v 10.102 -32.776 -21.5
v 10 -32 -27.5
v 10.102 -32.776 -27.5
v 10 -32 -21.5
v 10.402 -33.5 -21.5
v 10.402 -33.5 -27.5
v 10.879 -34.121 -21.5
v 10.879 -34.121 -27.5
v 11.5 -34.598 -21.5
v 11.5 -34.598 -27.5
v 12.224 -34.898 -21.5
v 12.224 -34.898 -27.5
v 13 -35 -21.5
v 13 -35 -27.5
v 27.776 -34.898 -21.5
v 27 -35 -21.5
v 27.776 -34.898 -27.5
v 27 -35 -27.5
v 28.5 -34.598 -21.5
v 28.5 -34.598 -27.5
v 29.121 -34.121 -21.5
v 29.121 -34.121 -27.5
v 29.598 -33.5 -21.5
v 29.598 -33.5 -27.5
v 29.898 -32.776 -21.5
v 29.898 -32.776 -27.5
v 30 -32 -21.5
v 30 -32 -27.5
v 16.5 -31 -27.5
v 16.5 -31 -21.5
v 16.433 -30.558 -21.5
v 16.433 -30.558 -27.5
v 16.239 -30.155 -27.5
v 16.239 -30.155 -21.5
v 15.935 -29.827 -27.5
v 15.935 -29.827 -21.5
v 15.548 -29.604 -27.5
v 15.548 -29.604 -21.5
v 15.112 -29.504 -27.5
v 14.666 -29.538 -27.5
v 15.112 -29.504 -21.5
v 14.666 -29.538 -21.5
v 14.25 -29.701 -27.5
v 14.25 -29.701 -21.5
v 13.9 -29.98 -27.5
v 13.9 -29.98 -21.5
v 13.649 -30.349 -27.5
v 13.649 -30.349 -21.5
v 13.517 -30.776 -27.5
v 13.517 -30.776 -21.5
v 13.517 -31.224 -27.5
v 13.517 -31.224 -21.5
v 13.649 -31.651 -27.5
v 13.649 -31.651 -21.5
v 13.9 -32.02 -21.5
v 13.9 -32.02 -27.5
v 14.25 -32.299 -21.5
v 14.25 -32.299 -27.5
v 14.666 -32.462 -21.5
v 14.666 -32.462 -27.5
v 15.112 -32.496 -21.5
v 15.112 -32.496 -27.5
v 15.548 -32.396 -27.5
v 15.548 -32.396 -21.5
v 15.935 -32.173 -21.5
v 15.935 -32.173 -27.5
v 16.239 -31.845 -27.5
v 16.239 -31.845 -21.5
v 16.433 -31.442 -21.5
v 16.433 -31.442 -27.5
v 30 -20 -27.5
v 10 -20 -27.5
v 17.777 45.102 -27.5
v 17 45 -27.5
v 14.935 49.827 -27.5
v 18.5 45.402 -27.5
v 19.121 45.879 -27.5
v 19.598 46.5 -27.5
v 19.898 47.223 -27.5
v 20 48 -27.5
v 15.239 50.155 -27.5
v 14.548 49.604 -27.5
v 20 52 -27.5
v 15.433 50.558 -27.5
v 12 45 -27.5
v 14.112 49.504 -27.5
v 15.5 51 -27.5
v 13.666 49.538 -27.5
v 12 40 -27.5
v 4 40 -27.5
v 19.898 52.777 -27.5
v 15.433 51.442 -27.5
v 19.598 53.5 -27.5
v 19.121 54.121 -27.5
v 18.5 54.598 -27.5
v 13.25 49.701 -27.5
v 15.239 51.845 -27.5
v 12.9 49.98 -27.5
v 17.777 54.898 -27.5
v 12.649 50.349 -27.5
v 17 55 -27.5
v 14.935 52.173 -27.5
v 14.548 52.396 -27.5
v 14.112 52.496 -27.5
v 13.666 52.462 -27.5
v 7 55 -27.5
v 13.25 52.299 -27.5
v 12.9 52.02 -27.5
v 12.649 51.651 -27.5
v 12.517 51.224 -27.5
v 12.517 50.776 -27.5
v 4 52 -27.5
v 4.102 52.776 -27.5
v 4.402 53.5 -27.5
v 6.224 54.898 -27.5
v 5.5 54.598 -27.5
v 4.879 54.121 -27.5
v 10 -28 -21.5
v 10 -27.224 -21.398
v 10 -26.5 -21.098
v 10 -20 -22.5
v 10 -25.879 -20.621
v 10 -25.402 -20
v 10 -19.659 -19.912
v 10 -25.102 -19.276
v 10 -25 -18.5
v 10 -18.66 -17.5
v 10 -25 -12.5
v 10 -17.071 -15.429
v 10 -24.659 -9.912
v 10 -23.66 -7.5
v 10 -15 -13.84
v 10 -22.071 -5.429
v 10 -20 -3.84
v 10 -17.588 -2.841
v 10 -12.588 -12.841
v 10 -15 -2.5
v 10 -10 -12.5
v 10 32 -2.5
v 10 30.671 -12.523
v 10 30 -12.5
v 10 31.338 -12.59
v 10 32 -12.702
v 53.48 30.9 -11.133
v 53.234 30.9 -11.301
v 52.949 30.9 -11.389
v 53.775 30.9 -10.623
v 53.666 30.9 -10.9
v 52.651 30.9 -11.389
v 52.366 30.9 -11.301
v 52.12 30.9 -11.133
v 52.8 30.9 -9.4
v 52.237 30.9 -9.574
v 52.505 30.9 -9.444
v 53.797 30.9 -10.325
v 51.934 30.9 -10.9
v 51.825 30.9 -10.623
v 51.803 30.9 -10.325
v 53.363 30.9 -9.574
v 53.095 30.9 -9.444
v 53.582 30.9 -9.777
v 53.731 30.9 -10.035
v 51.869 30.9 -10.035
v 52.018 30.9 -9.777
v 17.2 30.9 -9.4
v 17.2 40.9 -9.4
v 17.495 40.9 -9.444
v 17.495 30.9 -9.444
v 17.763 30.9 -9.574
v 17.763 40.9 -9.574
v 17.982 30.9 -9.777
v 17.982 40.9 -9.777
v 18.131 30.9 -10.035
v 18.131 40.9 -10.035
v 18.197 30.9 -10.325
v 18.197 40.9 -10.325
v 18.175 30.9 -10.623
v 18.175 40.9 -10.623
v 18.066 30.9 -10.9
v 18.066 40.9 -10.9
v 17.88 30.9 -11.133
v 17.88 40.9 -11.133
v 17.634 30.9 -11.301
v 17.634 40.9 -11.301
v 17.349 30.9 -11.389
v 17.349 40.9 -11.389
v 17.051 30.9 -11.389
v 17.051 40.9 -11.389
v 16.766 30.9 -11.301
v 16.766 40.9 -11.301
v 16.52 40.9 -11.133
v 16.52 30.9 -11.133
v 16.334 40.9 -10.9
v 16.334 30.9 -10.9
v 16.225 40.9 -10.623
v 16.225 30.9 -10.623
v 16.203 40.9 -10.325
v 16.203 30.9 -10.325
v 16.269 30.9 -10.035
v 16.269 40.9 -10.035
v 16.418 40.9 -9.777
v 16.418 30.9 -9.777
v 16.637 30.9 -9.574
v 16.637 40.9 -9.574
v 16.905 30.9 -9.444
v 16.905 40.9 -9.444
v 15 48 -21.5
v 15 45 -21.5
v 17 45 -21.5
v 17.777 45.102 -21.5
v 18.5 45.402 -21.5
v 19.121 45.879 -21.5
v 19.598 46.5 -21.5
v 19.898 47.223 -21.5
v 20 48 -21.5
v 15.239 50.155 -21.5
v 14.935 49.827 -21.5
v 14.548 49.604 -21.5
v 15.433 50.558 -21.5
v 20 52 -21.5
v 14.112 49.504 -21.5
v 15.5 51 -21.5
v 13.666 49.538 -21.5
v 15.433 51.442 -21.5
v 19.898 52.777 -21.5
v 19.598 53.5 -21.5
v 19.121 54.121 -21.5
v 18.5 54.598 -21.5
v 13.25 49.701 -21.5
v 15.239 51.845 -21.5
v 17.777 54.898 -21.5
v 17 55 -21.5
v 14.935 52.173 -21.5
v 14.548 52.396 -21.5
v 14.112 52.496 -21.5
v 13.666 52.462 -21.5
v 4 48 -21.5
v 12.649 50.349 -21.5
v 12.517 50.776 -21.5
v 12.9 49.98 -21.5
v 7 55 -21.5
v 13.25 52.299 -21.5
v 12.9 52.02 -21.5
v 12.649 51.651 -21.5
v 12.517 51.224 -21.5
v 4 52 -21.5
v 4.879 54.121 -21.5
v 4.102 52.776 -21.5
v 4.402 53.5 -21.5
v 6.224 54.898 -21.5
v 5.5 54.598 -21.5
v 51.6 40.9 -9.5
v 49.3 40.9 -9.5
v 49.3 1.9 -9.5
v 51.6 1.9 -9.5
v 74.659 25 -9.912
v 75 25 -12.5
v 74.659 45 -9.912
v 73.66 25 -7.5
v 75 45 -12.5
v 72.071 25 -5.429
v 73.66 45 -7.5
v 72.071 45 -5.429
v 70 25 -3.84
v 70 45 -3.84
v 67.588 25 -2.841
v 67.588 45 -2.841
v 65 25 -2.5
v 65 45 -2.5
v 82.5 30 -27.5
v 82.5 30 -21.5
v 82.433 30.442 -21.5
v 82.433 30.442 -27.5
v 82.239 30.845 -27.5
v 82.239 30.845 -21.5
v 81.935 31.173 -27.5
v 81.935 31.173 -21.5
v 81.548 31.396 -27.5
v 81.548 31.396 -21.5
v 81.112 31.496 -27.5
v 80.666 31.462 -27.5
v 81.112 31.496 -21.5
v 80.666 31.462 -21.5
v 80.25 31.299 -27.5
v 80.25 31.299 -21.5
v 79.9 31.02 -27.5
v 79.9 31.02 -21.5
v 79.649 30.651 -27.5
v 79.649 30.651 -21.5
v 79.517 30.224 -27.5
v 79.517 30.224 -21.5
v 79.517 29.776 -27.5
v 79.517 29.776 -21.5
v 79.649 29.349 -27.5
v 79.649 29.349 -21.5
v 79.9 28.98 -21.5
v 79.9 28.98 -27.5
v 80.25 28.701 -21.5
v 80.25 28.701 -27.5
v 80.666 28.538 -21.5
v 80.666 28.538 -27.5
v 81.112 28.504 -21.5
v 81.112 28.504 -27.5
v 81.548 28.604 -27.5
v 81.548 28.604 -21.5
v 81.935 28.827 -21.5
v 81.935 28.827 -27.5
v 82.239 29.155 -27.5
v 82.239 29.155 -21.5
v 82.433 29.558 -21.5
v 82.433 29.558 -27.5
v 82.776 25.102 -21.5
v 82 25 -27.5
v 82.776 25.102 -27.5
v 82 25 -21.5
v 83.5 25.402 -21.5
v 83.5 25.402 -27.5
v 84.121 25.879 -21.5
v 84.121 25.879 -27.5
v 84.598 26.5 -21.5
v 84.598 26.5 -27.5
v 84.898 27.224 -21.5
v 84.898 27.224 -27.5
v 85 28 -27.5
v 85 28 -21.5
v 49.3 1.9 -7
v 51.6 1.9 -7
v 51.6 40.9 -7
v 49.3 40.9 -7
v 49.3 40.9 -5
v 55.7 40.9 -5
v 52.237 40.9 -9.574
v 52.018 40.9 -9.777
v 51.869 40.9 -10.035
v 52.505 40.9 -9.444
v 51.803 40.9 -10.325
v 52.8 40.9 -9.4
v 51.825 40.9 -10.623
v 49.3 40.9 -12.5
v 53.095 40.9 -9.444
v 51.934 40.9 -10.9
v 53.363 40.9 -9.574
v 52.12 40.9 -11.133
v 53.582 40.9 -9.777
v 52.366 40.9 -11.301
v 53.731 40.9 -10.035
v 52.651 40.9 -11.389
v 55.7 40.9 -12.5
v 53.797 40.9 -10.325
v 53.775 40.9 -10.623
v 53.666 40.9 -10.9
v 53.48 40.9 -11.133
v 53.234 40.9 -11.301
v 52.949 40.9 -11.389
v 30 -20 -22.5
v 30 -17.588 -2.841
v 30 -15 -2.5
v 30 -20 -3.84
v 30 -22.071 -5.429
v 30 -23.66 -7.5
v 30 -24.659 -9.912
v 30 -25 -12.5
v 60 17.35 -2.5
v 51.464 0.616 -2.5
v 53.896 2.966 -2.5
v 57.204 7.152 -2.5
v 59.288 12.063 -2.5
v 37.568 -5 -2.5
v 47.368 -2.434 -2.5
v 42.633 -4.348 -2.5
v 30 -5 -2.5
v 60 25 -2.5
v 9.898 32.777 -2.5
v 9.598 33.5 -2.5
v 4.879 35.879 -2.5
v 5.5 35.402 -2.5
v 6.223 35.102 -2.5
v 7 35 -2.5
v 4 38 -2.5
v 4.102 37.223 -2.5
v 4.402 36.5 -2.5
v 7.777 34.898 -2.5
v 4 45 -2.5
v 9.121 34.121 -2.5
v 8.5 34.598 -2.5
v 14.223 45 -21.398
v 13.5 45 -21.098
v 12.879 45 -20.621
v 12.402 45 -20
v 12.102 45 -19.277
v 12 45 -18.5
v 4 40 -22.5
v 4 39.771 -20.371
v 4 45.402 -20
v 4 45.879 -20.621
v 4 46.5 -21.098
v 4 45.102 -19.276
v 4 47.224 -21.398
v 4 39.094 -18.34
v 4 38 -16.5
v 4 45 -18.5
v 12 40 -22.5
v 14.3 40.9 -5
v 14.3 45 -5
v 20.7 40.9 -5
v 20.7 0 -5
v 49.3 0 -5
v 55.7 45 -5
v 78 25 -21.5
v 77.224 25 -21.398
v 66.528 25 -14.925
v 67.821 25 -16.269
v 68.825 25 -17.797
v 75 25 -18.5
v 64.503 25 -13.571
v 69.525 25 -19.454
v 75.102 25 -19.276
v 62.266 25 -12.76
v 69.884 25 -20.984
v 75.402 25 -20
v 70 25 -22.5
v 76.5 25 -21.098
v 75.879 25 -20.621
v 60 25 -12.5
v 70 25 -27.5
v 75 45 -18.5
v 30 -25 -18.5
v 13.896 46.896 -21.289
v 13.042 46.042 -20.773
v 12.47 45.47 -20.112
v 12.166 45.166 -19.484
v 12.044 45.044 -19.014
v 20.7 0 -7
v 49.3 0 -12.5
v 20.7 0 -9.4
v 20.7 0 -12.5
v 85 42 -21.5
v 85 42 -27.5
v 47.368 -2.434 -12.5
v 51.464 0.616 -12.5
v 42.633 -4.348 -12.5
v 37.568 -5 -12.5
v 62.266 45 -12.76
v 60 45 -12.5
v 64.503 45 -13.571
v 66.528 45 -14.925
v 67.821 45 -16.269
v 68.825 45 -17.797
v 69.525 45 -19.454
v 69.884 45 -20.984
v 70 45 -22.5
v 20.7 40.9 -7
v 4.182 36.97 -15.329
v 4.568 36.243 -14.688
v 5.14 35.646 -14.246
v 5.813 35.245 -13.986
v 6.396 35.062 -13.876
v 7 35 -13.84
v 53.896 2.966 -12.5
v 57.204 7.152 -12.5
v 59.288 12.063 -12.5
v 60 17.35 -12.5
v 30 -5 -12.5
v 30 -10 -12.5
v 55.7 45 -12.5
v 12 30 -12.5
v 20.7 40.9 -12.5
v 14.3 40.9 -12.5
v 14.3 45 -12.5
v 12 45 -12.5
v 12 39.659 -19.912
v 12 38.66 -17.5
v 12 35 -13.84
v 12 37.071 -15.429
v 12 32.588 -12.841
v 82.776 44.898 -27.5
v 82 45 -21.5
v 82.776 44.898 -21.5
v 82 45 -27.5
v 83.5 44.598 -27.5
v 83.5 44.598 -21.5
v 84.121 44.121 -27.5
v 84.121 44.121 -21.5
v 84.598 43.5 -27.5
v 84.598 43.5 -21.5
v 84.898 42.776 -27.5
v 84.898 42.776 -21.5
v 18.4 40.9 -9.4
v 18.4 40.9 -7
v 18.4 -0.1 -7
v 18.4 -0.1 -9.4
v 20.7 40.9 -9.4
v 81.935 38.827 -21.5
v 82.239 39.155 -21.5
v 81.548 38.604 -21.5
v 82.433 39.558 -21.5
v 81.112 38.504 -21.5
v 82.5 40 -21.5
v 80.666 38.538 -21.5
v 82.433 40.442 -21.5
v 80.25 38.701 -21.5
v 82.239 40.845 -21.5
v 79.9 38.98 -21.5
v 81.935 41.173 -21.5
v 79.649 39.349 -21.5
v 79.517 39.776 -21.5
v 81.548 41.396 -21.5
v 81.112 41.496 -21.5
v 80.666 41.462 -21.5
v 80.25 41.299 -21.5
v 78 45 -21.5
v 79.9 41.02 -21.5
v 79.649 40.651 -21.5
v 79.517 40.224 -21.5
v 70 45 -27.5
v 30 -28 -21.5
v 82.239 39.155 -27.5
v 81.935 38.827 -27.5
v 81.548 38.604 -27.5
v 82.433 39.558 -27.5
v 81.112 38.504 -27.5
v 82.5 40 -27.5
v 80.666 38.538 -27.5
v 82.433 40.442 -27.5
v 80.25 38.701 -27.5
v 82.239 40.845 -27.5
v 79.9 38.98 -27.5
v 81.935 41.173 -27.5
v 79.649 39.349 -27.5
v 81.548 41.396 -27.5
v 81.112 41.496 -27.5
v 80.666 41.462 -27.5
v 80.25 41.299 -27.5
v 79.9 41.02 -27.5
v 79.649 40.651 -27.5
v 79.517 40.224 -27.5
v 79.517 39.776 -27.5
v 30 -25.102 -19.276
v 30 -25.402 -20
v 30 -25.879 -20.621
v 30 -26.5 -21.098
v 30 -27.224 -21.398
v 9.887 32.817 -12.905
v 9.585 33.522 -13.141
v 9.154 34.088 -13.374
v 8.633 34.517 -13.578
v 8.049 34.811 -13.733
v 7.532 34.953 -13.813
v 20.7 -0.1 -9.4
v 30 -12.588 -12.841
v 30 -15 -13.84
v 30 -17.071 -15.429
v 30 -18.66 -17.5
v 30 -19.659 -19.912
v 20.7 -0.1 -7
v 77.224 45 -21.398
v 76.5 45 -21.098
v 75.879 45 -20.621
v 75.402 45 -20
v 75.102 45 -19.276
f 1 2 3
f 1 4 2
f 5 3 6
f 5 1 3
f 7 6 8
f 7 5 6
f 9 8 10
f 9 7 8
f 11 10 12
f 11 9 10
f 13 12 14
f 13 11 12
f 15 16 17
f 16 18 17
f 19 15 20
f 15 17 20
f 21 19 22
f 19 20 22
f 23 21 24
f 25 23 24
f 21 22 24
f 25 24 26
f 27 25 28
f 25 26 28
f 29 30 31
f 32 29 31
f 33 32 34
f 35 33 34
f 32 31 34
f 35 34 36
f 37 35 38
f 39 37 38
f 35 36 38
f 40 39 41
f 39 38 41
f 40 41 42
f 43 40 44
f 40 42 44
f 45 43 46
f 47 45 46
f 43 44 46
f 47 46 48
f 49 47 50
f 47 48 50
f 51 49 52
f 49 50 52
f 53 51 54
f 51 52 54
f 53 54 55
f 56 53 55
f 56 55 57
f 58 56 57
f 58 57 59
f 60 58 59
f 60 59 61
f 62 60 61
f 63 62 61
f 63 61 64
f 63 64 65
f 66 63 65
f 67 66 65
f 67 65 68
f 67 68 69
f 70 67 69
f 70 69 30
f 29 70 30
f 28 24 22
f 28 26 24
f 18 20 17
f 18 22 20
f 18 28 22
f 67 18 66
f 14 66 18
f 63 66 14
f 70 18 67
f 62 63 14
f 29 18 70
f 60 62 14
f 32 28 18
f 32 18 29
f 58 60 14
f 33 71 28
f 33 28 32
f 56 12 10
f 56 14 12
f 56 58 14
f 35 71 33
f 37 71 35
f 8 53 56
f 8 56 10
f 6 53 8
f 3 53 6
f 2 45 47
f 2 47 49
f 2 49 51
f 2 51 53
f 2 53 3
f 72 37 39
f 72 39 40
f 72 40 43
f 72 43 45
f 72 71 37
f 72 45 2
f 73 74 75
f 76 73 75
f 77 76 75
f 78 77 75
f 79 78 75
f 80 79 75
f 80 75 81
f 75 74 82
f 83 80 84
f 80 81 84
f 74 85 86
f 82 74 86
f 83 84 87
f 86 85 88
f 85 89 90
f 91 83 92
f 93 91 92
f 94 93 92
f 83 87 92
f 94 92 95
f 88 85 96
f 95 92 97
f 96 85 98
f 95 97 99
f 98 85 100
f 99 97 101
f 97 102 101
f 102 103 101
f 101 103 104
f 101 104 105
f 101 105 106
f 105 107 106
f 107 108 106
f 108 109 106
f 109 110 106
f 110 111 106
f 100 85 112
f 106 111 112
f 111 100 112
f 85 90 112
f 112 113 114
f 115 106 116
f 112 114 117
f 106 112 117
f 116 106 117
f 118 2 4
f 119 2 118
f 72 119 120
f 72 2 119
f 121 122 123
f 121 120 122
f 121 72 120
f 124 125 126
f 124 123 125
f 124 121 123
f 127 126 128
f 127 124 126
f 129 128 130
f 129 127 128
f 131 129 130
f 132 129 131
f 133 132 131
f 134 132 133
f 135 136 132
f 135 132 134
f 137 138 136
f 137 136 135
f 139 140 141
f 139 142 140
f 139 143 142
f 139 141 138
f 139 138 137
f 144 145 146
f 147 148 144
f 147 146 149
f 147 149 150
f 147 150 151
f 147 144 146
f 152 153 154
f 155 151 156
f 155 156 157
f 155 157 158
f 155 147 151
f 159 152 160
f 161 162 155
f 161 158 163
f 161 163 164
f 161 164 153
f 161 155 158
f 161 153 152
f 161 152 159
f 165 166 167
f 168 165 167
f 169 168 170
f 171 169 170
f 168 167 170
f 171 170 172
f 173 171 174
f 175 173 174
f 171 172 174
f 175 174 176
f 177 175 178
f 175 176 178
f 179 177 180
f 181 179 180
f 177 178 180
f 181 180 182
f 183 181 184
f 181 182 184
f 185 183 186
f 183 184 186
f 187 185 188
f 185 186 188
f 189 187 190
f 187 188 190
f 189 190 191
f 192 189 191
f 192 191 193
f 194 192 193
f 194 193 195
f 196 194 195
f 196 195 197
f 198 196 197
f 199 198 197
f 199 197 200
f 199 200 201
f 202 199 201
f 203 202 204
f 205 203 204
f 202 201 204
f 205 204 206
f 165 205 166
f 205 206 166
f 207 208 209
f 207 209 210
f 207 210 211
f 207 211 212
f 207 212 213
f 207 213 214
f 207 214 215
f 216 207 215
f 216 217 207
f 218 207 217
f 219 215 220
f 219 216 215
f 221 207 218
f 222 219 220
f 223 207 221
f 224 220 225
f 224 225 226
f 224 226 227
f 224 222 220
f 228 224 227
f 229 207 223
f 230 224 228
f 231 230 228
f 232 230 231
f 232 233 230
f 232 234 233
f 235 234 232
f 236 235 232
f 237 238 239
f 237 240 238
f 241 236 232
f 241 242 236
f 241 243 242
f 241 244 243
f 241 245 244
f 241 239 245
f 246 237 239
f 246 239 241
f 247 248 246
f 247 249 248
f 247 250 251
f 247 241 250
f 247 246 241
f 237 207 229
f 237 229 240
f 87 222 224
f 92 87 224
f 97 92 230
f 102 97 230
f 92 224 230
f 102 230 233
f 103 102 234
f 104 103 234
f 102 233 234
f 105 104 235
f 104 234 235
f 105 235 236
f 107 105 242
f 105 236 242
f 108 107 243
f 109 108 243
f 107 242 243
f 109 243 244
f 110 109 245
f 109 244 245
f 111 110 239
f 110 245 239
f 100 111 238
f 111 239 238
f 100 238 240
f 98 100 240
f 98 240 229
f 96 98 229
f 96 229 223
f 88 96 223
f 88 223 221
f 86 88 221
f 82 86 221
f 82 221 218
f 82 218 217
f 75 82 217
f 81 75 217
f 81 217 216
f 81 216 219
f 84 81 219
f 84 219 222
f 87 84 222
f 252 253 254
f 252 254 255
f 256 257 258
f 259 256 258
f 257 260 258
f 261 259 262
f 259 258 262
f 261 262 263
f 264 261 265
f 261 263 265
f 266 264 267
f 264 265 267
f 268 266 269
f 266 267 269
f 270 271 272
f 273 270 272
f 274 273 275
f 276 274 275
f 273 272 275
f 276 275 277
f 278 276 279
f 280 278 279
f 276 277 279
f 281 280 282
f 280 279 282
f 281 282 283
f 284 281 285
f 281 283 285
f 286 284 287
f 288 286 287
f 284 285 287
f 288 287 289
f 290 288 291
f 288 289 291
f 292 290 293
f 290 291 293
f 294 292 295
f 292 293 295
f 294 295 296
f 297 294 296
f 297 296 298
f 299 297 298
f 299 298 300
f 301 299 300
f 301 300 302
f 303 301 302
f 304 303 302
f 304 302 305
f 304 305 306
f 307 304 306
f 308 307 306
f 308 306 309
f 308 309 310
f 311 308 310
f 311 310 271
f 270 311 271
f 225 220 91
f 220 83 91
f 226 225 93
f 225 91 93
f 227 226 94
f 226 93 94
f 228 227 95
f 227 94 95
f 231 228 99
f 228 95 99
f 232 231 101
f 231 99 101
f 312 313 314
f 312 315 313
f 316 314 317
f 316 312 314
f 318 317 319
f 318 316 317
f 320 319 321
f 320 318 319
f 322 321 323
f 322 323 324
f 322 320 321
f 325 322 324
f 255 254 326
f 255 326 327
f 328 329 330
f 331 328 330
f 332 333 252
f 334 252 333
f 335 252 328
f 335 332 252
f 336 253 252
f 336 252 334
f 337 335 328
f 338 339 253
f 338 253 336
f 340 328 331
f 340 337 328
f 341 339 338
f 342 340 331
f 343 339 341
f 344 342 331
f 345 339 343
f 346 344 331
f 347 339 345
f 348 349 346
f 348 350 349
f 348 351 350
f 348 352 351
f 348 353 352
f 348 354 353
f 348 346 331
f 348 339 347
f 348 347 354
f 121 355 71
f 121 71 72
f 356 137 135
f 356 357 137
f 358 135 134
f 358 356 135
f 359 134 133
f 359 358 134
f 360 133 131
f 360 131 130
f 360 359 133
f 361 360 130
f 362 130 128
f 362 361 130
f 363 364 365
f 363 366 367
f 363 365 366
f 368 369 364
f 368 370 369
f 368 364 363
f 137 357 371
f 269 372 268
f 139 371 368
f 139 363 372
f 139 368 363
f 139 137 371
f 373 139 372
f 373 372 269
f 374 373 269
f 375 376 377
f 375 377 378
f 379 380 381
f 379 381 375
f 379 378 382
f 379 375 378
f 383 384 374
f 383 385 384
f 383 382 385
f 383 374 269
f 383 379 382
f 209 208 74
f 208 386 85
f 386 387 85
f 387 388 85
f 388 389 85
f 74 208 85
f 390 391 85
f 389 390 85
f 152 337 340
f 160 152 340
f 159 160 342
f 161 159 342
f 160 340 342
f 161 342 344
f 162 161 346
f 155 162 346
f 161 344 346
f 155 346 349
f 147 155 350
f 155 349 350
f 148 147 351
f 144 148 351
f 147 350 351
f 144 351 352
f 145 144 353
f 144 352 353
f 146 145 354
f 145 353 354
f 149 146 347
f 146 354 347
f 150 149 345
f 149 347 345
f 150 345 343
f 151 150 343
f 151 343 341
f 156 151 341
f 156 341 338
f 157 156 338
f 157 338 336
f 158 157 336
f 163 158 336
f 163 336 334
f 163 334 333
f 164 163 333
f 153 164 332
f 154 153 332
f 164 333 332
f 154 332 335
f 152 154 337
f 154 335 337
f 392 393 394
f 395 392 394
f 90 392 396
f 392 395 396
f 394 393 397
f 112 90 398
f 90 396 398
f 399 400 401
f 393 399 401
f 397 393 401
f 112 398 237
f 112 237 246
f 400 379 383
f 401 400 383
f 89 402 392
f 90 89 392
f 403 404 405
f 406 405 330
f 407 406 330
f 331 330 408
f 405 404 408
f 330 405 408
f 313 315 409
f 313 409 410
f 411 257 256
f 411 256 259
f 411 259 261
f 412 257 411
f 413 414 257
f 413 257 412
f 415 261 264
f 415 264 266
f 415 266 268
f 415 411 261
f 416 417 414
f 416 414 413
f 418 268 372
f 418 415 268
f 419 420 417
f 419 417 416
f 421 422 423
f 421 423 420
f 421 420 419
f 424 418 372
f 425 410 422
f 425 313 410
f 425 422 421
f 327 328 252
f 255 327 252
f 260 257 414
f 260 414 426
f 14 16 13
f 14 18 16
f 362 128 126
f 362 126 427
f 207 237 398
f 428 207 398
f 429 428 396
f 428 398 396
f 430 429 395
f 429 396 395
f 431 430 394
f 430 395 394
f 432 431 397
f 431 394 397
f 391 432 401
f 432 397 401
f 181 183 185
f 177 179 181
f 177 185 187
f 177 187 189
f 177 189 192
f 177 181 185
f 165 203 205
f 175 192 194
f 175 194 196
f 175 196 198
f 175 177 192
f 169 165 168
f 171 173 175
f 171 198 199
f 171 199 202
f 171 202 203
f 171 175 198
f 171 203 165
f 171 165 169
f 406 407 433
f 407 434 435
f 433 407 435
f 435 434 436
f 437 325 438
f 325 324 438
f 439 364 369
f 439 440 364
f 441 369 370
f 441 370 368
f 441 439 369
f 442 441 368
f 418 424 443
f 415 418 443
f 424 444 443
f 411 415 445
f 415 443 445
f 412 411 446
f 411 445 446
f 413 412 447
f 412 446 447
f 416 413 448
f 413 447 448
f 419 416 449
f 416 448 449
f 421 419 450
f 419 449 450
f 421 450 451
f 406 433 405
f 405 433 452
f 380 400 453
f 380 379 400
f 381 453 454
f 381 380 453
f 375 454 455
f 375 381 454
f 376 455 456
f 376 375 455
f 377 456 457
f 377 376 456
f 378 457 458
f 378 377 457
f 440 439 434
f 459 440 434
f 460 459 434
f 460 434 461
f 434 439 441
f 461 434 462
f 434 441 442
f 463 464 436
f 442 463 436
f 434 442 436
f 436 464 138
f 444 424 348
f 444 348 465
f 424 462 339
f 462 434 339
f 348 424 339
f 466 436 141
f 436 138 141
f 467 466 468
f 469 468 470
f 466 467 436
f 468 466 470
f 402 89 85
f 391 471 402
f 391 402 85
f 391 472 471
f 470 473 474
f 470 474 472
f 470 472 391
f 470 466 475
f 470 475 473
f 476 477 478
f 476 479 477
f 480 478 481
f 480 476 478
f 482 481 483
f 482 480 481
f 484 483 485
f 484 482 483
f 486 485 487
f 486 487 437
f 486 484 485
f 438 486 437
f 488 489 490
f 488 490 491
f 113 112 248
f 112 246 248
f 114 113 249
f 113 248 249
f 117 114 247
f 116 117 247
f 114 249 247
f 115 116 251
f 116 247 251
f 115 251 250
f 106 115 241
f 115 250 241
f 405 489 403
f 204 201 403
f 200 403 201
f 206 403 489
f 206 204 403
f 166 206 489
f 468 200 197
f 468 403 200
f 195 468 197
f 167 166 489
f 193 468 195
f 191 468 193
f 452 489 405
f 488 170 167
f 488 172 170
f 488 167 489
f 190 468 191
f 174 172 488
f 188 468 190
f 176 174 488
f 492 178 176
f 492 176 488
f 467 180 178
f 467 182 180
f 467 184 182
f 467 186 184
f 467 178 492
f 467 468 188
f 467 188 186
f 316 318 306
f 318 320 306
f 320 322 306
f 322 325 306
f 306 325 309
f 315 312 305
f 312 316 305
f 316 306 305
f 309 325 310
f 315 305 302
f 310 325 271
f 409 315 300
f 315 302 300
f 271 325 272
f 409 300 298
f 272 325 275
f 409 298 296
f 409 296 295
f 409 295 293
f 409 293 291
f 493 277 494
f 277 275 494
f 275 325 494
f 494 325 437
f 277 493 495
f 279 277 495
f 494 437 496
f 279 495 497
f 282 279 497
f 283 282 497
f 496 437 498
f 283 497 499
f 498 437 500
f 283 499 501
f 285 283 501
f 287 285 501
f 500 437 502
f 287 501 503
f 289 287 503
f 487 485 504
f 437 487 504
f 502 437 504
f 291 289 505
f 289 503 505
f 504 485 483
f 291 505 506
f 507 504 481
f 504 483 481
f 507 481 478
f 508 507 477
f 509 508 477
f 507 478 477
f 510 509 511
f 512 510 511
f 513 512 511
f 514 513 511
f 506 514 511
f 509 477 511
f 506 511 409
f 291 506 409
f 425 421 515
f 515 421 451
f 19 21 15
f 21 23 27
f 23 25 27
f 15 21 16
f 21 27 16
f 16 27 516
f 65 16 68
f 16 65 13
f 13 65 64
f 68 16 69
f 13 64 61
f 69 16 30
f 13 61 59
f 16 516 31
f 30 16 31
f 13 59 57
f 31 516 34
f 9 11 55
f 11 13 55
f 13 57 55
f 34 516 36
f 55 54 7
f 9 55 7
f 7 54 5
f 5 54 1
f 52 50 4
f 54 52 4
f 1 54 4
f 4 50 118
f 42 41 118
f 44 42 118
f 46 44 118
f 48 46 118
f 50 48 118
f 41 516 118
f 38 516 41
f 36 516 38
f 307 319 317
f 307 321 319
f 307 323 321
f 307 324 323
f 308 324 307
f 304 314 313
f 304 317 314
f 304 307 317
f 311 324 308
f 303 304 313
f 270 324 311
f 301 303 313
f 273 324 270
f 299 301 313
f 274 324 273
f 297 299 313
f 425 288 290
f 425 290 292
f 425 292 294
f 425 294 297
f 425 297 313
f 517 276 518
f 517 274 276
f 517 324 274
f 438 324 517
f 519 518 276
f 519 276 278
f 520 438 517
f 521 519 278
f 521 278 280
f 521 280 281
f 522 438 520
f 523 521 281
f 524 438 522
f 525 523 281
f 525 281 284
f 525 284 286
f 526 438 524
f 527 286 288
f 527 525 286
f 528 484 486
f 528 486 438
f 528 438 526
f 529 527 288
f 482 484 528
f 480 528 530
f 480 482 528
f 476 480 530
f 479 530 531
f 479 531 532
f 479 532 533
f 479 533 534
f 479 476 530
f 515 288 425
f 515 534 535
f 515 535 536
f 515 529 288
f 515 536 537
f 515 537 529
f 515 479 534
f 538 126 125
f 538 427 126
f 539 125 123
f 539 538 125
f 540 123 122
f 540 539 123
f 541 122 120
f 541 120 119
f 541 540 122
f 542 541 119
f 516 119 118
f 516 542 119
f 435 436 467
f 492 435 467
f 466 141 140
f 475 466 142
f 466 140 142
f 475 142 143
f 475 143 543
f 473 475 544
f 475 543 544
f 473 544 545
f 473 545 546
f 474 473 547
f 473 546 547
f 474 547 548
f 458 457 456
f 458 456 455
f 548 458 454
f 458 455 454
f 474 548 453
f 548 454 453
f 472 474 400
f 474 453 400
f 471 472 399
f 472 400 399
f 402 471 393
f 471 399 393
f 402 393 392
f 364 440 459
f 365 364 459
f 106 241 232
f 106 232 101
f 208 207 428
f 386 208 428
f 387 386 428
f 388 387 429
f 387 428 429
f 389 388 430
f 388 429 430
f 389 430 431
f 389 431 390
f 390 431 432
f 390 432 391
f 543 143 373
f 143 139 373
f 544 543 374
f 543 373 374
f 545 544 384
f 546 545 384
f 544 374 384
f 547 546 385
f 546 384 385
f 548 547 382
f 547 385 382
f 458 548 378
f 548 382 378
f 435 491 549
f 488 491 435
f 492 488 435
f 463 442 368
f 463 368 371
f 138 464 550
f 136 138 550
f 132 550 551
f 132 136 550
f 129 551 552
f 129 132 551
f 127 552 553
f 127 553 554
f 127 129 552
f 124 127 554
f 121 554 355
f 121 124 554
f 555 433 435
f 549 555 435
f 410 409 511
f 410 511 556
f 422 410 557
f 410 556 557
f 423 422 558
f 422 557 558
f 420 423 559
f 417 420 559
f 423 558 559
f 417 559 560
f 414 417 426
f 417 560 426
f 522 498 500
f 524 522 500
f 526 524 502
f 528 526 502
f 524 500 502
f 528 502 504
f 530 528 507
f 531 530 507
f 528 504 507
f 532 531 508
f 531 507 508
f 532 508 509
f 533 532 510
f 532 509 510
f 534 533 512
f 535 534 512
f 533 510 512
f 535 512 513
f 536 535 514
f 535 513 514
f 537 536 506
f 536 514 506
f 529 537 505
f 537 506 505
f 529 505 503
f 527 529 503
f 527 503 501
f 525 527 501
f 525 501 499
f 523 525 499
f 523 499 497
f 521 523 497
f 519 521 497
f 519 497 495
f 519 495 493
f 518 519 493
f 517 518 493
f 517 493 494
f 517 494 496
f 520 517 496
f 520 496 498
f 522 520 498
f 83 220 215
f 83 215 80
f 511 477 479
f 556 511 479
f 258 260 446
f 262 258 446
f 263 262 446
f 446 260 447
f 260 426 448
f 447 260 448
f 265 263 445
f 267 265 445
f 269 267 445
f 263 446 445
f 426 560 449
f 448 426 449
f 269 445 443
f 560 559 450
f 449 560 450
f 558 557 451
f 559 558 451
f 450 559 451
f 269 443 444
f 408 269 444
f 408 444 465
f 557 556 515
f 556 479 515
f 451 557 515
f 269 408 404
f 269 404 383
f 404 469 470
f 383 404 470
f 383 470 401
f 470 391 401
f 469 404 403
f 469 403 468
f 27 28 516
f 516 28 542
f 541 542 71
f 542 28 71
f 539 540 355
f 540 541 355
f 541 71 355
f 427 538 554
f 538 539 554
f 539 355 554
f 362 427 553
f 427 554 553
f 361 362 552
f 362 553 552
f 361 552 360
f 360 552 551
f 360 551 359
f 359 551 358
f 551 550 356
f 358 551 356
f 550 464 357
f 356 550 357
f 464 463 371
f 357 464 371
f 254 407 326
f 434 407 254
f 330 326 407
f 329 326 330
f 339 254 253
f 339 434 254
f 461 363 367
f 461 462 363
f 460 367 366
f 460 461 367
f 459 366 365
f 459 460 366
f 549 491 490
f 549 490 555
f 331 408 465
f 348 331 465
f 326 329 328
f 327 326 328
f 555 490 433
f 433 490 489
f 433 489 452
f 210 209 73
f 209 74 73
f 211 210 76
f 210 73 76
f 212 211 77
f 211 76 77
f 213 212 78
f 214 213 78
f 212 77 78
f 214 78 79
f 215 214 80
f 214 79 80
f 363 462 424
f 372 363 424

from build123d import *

# Parameters (mm, degrees)
SKETCH1_W                = 10
SKETCH1_H                = 20
BOSS_EXTRUDE2_DEPTH      = 10
SKETCH3_W                = 10
SKETCH3_H                = 20
BOSS_EXTRUDE3_DEPTH      = 10
SKETCH4_W                = 62.5
SKETCH4_H                = 5
BOSS_EXTRUDE4_DEPTH      = 10
SKETCH6_R                = 1
CUT_EXTRUDE1_DEPTH       = 10
CUT_EXTRUDE3_START       = -10
SKETCH10_R               = 1
CUT_EXTRUDE3_DEPTH       = 10
SKETCH11_W               = 50
SKETCH11_H               = 50
BOSS_EXTRUDE8_DEPTH      = 10
SKETCH18_W               = 10
SKETCH18_H               = 10
BOSS_EXTRUDE9_DEPTH      = 6
SKETCH20_W               = 10
SKETCH20_H               = 10
BOSS_EXTRUDE10_DEPTH     = 12
SKETCH23_W               = 28.6
SKETCH23_H               = 45
CUT_EXTRUDE10_DEPTH      = 7.5
SKETCH24_W               = 6.4
SKETCH24_H               = 7.5
CUT_EXTRUDE11_DEPTH      = 4.1
SKETCH25_W               = 2.3
SKETCH25_H               = 2.5
CUT_EXTRUDE12_DEPTH      = 39
SKETCH26_W               = 2.3
SKETCH26_H               = 2.4
CUT_EXTRUDE13_DEPTH      = 41
SKETCH27_R               = 1
CUT_EXTRUDE14_DEPTH      = 10
SKETCH28_R               = 1
CUT_EXTRUDE15_DEPTH      = 10
SKETCH31_W               = 12.5
SKETCH31_H               = 10
BOSS_EXTRUDE11_DEPTH     = 5
SKETCH32_W               = 10
SKETCH32_H               = 10
CUT_EXTRUDE16_DEPTH      = 7.5
CUT_EXTRUDE17_DEPTH      = 7.5
SKETCH33_W               = 10
SKETCH33_H               = 10
BOSS_EXTRUDE12_DEPTH     = 5
SKETCH34_W               = 10
SKETCH34_H               = 10
BOSS_EXTRUDE13_DEPTH     = 5
SKETCH35_W               = 10
SKETCH35_H               = 10
BOSS_EXTRUDE14_DEPTH     = 3.5
SKETCH36_W               = 10
SKETCH36_H               = 10
BOSS_EXTRUDE15_DEPTH     = 9.5
CUT_EXTRUDE18_DEPTH      = 90.5
CUT_EXTRUDE18_DEPTH_BACK = 15.5
SKETCH37_R               = 1.25
CUT_EXTRUDE19_DEPTH      = 88.5
CUT_EXTRUDE19_DEPTH_BACK = 15.5
SKETCH38_R               = 1.25
SKETCH39_W               = 29.967126749
SKETCH39_H               = 31.835751001
SKETCH39_W_2             = 15.617210398
SKETCH39_H_2             = 32.298255859
CUT_EXTRUDE20_DEPTH      = 36
SKETCH40_W               = 10
SKETCH40_H               = 10
BOSS_EXTRUDE16_DEPTH     = 6
SKETCH41_W               = 20
SKETCH41_H               = 10
BOSS_EXTRUDE17_DEPTH     = 20
SKETCH43_W               = 10
SKETCH43_H               = 20
BOSS_EXTRUDE18_DEPTH     = 15
SKETCH44_W               = 5
SKETCH44_H               = 20
SKETCH44_W_2             = 20
SKETCH44_H_2             = 5
SKETCH44_W_3             = 8
BOSS_EXTRUDE19_DEPTH     = 13
SKETCH45_W               = 15
SKETCH45_H               = 20
SKETCH45_W_2             = 20
SKETCH45_H_2             = 15
SKETCH45_W_3             = 8
BOSS_EXTRUDE20_DEPTH     = 4
SKETCH49_W               = 8
SKETCH49_H               = 15
SKETCH49_W_2             = 20
SKETCH49_W_3             = 15
SKETCH49_H_2             = 20
BOSS_EXTRUDE21_DEPTH     = 2
SKETCH47_R               = 1.5
CUT_EXTRUDE22_DEPTH      = 10
FILLET1_R                = 3
FILLET2_R                = 10
CUT_EXTRUDE23_DEPTH      = 10
FILLET3_R                = 20
FILLET7_R                = 3
FILLET8_R                = 3
SKETCH50_W               = 6
SKETCH50_H               = 10
BOSS_EXTRUDE22_DEPTH     = 8
SKETCH46_R               = 1.5
CUT_EXTRUDE21_DEPTH      = 10
FILLET10_R               = 3


with BuildPart() as part:
    # Sketch1 → Boss-Extrude2 (new body)
    with BuildSketch(Plane(origin=(0, 0, 0), x_dir=(1, 0, 0), z_dir=(0, 1, 0))):
        with Locations((5, 10)):
            Rectangle(SKETCH1_W, SKETCH1_H)
    extrude(amount=BOSS_EXTRUDE2_DEPTH)



with BuildPart() as body_2:
    # Sketch3 → Boss-Extrude3 (new body)
    with BuildSketch(Plane(origin=(0, 0, 0), x_dir=(1, 0, 0), z_dir=(0, 1, 0))):
        with Locations((77.5, 10)):
            Rectangle(SKETCH3_W, SKETCH3_H)
    extrude(amount=BOSS_EXTRUDE3_DEPTH)


with BuildPart() as part_1:
    add(part.part)

    add(body_2.part)  # Boss-Extrude4 merges body 2
    # Sketch4 → Boss-Extrude4 (add)
    with BuildSketch(Plane(origin=(0, 0, 0), x_dir=(1, 0, 0), z_dir=(0, 1, 0))):
        with Locations((41.25, 10)):
            Rectangle(SKETCH4_W, SKETCH4_H)
    extrude(amount=BOSS_EXTRUDE4_DEPTH)

    # Sketch6 → Cut-Extrude1 (cut)
    with BuildSketch(Plane(origin=(10, 0, 0), x_dir=(0, 0, -1), z_dir=(1, 0, 0))):
        with Locations((16.25, 5)):
            Circle(SKETCH6_R)
    extrude(amount=-CUT_EXTRUDE1_DEPTH, mode=Mode.SUBTRACT)

    # Sketch10 → Cut-Extrude3 (cut)
    with BuildSketch(Plane.ZY.offset(-72.5).offset(CUT_EXTRUDE3_START)):
        with Locations(Location((-16.25, 5, 0), (0, 0, 180))):
            Circle(SKETCH10_R)
    extrude(amount=CUT_EXTRUDE3_DEPTH, mode=Mode.SUBTRACT)

    # Sketch11 → Boss-Extrude8 (add)
    with BuildSketch(Plane(origin=(0, 0, -12.5), x_dir=(-1, 0, 0), z_dir=(0, 0, -1))):
        with Locations((-35, 20)):
            Rectangle(SKETCH11_W, SKETCH11_H)
    extrude(amount=-BOSS_EXTRUDE8_DEPTH)

    # Sketch18 → Boss-Extrude9 (add)
    with BuildSketch(Plane.XY):
        with Locations((5, 5)):
            Rectangle(SKETCH18_W, SKETCH18_H)
    extrude(amount=BOSS_EXTRUDE9_DEPTH)

    # Sketch20 → Boss-Extrude10 (add)
    with BuildSketch(Plane.XZ):
        with Locations((77.5, -7.5)):
            Rectangle(SKETCH20_W, SKETCH20_H)
        with Locations((5, -7.5)):
            Rectangle(SKETCH20_W, SKETCH20_H)
    extrude(amount=BOSS_EXTRUDE10_DEPTH)

    # Sketch23 → Cut-Extrude10 (cut)
    with BuildSketch(Plane(origin=(0, 0, -12.5), x_dir=(-1, 0, 0), z_dir=(0, 0, -1))):
        with Locations((-35, 22.5)):
            Rectangle(SKETCH23_W, SKETCH23_H)
    extrude(amount=-CUT_EXTRUDE10_DEPTH, mode=Mode.SUBTRACT)

    # Sketch24 → Cut-Extrude11 (cut)
    with BuildSketch(Plane(origin=(0, 45, 0), x_dir=(1, 0, 0), z_dir=(0, 1, 0))):
        with Locations((17.5, 8.75)):
            Rectangle(SKETCH24_W, SKETCH24_H)
        with Locations((52.5, 8.75)):
            Rectangle(SKETCH24_W, SKETCH24_H)
    extrude(amount=-CUT_EXTRUDE11_DEPTH, mode=Mode.SUBTRACT)

    # Sketch25 → Cut-Extrude12 (cut)
    with BuildSketch(Plane(origin=(0, 40.9, 0), x_dir=(1, 0, 0), z_dir=(0, 1, 0))):
        with Locations((50.45, 8.25)):
            Rectangle(SKETCH25_W, SKETCH25_H)
    extrude(amount=-CUT_EXTRUDE12_DEPTH, mode=Mode.SUBTRACT)

    # Sketch26 → Cut-Extrude13 (cut)
    with BuildSketch(Plane(origin=(0, 40.9, 0), x_dir=(1, 0, 0), z_dir=(0, 1, 0))):
        with Locations((19.55, 8.2)):
            Rectangle(SKETCH26_W, SKETCH26_H)
    extrude(amount=-CUT_EXTRUDE13_DEPTH, mode=Mode.SUBTRACT)

    # Sketch27 → Cut-Extrude14 (cut)
    with BuildSketch(Plane(origin=(0, 40.9, 0), x_dir=(1, 0, 0), z_dir=(0, 1, 0))):
        with Locations(Location((17.2, 10.4, 0), (0, 0, 270))):
            Circle(SKETCH27_R)
    extrude(amount=-CUT_EXTRUDE14_DEPTH, mode=Mode.SUBTRACT)

    # Sketch28 → Cut-Extrude15 (cut)
    with BuildSketch(Plane(origin=(0, 40.9, 0), x_dir=(1, 0, 0), z_dir=(0, 1, 0))):
        with Locations(Location((52.8, 10.4, 0), (0, 0, 270))):
            Circle(SKETCH28_R)
    extrude(amount=-CUT_EXTRUDE15_DEPTH, mode=Mode.SUBTRACT)

    # Sketch31 → Boss-Extrude11 (add)
    with BuildSketch(Plane.XY.offset(-7.5)):
        with Locations((66.25, 5)):
            Rectangle(SKETCH31_W, SKETCH31_H)
    extrude(amount=BOSS_EXTRUDE11_DEPTH)

    # Sketch32 → Cut-Extrude16 (cut)
    with BuildSketch(Plane(origin=(0, 0, -20), x_dir=(-1, 0, 0), z_dir=(0, 0, -1))):
        with Locations((-77.5, 5)):
            Rectangle(SKETCH32_W, SKETCH32_H)
    extrude(amount=-CUT_EXTRUDE16_DEPTH, mode=Mode.SUBTRACT)

    # 3DSketch1 → Cut-Extrude17 (cut)
    with BuildSketch(Plane(origin=(10, 0, -20), x_dir=(-0.7071067811865476, 0.7071067811865476, 0), z_dir=(0, 0, 1))):
        Polygon((0, 0), (7.071067812, 7.071067812), (14.142135624, 0), (7.071067812, -7.071067812), align=None)
    extrude(amount=CUT_EXTRUDE17_DEPTH, mode=Mode.SUBTRACT)

    # Sketch33 → Boss-Extrude12 (add)
    with BuildSketch(Plane.XZ.offset(12)):
        with Locations((5, -7.5)):
            Rectangle(SKETCH33_W, SKETCH33_H)
    extrude(amount=BOSS_EXTRUDE12_DEPTH)

    # Sketch34 → Boss-Extrude13 (add)
    with BuildSketch(Plane.XZ.offset(12)):
        with Locations((77.5, -7.5)):
            Rectangle(SKETCH34_W, SKETCH34_H)
    extrude(amount=BOSS_EXTRUDE13_DEPTH)

    # Sketch35 → Boss-Extrude14 (add)
    with BuildSketch(Plane.XY.offset(6)):
        with Locations((5, 5)):
            Rectangle(SKETCH35_W, SKETCH35_H)
    extrude(amount=BOSS_EXTRUDE14_DEPTH)

    # Sketch36 → Boss-Extrude15 (add)
    with BuildSketch(Plane.XY):
        with Locations((77.5, 5)):
            Rectangle(SKETCH36_W, SKETCH36_H)
    extrude(amount=BOSS_EXTRUDE15_DEPTH)

    # Sketch37 → Cut-Extrude18 (cut, two sides: drawn at the far end of the back side and taken through both)
    with BuildSketch(Plane(origin=(10, 0, 0), x_dir=(0, 0, -1), z_dir=(1, 0, 0)).offset(-CUT_EXTRUDE18_DEPTH_BACK)):
        with Locations(Location((-3.5, 5, 0), (0, 0, 180))):
            Circle(SKETCH37_R)
    extrude(amount=CUT_EXTRUDE18_DEPTH + CUT_EXTRUDE18_DEPTH_BACK, mode=Mode.SUBTRACT)

    # Sketch38 → Cut-Extrude19 (cut, two sides: drawn at the far end of the back side and taken through both)
    with BuildSketch(Plane(origin=(10, 0, 0), x_dir=(0, 0, -1), z_dir=(1, 0, 0)).offset(-CUT_EXTRUDE19_DEPTH_BACK)):
        with Locations(Location((7.5, -11, 0), (0, 0, 180))):
            Circle(SKETCH38_R)
    extrude(amount=CUT_EXTRUDE19_DEPTH + CUT_EXTRUDE19_DEPTH_BACK, mode=Mode.SUBTRACT)

    # Sketch39 → Cut-Extrude20 (cut)
    with BuildSketch(Plane(origin=(0, 0, -12.5), x_dir=(-1, 0, 0), z_dir=(0, 0, -1))):
        with Locations((-74.983563375, -4.30748393)):
            Rectangle(SKETCH39_W, SKETCH39_H)
        with Locations((-2.191394801, -3.536642501)):
            Rectangle(SKETCH39_W_2, SKETCH39_H_2)
    extrude(amount=-CUT_EXTRUDE20_DEPTH, mode=Mode.SUBTRACT)

    # Sketch40 → Boss-Extrude16 (add)
    with BuildSketch(Plane.ZY.offset(-10)):
        with Locations((-7.5, 40)):
            Rectangle(SKETCH40_W, SKETCH40_H)
    extrude(amount=BOSS_EXTRUDE16_DEPTH)

    # Sketch41 → Boss-Extrude17 (add)
    with BuildSketch(Plane.XZ.offset(5)):
        with Locations((20, -7.5)):
            Rectangle(SKETCH41_W, SKETCH41_H)
    extrude(amount=BOSS_EXTRUDE17_DEPTH)

    # Sketch43 → Boss-Extrude18 (add)
    with BuildSketch(Plane(origin=(60, 0, 0), x_dir=(0, 0, -1), z_dir=(1, 0, 0))):
        with Locations((7.5, 35)):
            Rectangle(SKETCH43_W, SKETCH43_H)
    extrude(amount=BOSS_EXTRUDE18_DEPTH)

    # Sketch44 → Boss-Extrude19 (add)
    with BuildSketch(Plane(origin=(0, 0, -12.5), x_dir=(-1, 0, 0), z_dir=(0, 0, -1))):
        with Locations((-72.5, 35)):
            Rectangle(SKETCH44_W, SKETCH44_H)
        with Locations((-20, -22.5)):
            Rectangle(SKETCH44_W_2, SKETCH44_H_2)
        with Locations((-8, 42.5)):
            Rectangle(SKETCH44_W_3, SKETCH44_H_2)
    extrude(amount=BOSS_EXTRUDE19_DEPTH)

    # Sketch45 → Boss-Extrude20 (add)
    with BuildSketch(Plane(origin=(0, 0, -25.5), x_dir=(-1, 0, 0), z_dir=(0, 0, -1))):
        with Locations((-77.5, 35)):
            Rectangle(SKETCH45_W, SKETCH45_H)
        with Locations((-20, -27.5)):
            Rectangle(SKETCH45_W_2, SKETCH45_H_2)
        with Locations((-8, 47.5)):
            Rectangle(SKETCH45_W_3, SKETCH45_H_2)
    extrude(amount=-BOSS_EXTRUDE20_DEPTH)

    # Sketch49 → Boss-Extrude21 (add)
    with BuildSketch(Plane(origin=(0, 0, -25.5), x_dir=(-1, 0, 0), z_dir=(0, 0, -1))):
        with Locations((-8, 47.5)):
            Rectangle(SKETCH49_W, SKETCH49_H)
        with Locations((-20, -27.5)):
            Rectangle(SKETCH49_W_2, SKETCH49_H)
        with Locations((-77.5, 35)):
            Rectangle(SKETCH49_W_3, SKETCH49_H_2)
    extrude(amount=BOSS_EXTRUDE21_DEPTH)

    # Sketch47 → Cut-Extrude22 (cut)
    with BuildSketch(Plane.XY.offset(-21.5)):
        with Locations((15, -31)):
            Circle(SKETCH47_R)
        with Locations((81, 30)):
            Circle(SKETCH47_R)
        with Locations((81, 40)):
            Circle(SKETCH47_R)
    extrude(amount=-CUT_EXTRUDE22_DEPTH, mode=Mode.SUBTRACT)

    # Fillet1
    fillet1_edges = [part_1.edges().sort_by_distance(p)[0] for p in [
        (20, -25, -21.5),
        (8, 45, -21.5),
        (75, 35, -21.5),
    ]]
    fillet(fillet1_edges, radius=FILLET1_R)

    # Fillet2
    fillet2_edges = [part_1.edges().sort_by_distance(p)[0] for p in [
        (8, 40, -12.5),
        (20, -20, -12.5),
        (20, -25, -2.5),
        (75, 35, -2.5),
        (70, 35, -12.5),
    ]]
    fillet(fillet2_edges, radius=FILLET2_R)

    # Sketch48 → Cut-Extrude23 (cut)
    with BuildSketch(Plane(origin=(0, 0, -12.5), x_dir=(-1, 0, 0), z_dir=(0, 0, -1))):
        Polygon((-41.126439375, -9.370767462), (-66.809029943, 15.441226815), (-67.788450769, -8.064873027), align=None)
    extrude(amount=-CUT_EXTRUDE23_DEPTH, mode=Mode.SUBTRACT)

    # Fillet3
    fillet3_edges = [part_1.edges().sort_by_distance(p)[0] for p in [
        (60, 8.863011447, -7.5),
        (45.650567099, -5, -7.5),
    ]]
    fillet(fillet3_edges, radius=FILLET3_R)

    # Fillet7
    fillet7_edges = [part_1.edges().sort_by_distance(p)[0] for p in [
        (10, 35, -8.169872981),
        (4, 35, -8.169872981),
    ]]
    fillet(fillet7_edges, radius=FILLET7_R - 0.0001)  # a hair under: the kernel refuses the full size

    # Fillet8
    fillet8_edges = [part_1.edges().sort_by_distance(p)[0] for p in [
        (85, 45, -24.5),
        (85, 25, -24.5),
        (30, -35, -24.5),
        (10, -35, -24.5),
        (4, 55, -24.5),
    ]]
    fillet(fillet8_edges, radius=FILLET8_R)

    # Sketch50 → Boss-Extrude22 (add)
    with BuildSketch(Plane(origin=(12, 0, 0), x_dir=(0, 0, -1), z_dir=(1, 0, 0))):
        with Locations((24.5, 50)):
            Rectangle(SKETCH50_W, SKETCH50_H)
    extrude(amount=BOSS_EXTRUDE22_DEPTH)

    # Sketch46 → Cut-Extrude21 (cut)
    with BuildSketch(Plane.XY.offset(-21.5)):
        with Locations((14, 51)):
            Circle(SKETCH46_R)
    extrude(amount=-CUT_EXTRUDE21_DEPTH, mode=Mode.SUBTRACT)

    # Fillet10
    fillet10_edges = [part_1.edges().sort_by_distance(p)[0] for p in [
        (12, 46.5, -21.5),
        (20, 45, -24.5),
        (20, 55, -24.5),
    ]]
    fillet(fillet10_edges, radius=FILLET10_R - 0.0001)  # a hair under: the kernel refuses the full size


solid = part_1.part
